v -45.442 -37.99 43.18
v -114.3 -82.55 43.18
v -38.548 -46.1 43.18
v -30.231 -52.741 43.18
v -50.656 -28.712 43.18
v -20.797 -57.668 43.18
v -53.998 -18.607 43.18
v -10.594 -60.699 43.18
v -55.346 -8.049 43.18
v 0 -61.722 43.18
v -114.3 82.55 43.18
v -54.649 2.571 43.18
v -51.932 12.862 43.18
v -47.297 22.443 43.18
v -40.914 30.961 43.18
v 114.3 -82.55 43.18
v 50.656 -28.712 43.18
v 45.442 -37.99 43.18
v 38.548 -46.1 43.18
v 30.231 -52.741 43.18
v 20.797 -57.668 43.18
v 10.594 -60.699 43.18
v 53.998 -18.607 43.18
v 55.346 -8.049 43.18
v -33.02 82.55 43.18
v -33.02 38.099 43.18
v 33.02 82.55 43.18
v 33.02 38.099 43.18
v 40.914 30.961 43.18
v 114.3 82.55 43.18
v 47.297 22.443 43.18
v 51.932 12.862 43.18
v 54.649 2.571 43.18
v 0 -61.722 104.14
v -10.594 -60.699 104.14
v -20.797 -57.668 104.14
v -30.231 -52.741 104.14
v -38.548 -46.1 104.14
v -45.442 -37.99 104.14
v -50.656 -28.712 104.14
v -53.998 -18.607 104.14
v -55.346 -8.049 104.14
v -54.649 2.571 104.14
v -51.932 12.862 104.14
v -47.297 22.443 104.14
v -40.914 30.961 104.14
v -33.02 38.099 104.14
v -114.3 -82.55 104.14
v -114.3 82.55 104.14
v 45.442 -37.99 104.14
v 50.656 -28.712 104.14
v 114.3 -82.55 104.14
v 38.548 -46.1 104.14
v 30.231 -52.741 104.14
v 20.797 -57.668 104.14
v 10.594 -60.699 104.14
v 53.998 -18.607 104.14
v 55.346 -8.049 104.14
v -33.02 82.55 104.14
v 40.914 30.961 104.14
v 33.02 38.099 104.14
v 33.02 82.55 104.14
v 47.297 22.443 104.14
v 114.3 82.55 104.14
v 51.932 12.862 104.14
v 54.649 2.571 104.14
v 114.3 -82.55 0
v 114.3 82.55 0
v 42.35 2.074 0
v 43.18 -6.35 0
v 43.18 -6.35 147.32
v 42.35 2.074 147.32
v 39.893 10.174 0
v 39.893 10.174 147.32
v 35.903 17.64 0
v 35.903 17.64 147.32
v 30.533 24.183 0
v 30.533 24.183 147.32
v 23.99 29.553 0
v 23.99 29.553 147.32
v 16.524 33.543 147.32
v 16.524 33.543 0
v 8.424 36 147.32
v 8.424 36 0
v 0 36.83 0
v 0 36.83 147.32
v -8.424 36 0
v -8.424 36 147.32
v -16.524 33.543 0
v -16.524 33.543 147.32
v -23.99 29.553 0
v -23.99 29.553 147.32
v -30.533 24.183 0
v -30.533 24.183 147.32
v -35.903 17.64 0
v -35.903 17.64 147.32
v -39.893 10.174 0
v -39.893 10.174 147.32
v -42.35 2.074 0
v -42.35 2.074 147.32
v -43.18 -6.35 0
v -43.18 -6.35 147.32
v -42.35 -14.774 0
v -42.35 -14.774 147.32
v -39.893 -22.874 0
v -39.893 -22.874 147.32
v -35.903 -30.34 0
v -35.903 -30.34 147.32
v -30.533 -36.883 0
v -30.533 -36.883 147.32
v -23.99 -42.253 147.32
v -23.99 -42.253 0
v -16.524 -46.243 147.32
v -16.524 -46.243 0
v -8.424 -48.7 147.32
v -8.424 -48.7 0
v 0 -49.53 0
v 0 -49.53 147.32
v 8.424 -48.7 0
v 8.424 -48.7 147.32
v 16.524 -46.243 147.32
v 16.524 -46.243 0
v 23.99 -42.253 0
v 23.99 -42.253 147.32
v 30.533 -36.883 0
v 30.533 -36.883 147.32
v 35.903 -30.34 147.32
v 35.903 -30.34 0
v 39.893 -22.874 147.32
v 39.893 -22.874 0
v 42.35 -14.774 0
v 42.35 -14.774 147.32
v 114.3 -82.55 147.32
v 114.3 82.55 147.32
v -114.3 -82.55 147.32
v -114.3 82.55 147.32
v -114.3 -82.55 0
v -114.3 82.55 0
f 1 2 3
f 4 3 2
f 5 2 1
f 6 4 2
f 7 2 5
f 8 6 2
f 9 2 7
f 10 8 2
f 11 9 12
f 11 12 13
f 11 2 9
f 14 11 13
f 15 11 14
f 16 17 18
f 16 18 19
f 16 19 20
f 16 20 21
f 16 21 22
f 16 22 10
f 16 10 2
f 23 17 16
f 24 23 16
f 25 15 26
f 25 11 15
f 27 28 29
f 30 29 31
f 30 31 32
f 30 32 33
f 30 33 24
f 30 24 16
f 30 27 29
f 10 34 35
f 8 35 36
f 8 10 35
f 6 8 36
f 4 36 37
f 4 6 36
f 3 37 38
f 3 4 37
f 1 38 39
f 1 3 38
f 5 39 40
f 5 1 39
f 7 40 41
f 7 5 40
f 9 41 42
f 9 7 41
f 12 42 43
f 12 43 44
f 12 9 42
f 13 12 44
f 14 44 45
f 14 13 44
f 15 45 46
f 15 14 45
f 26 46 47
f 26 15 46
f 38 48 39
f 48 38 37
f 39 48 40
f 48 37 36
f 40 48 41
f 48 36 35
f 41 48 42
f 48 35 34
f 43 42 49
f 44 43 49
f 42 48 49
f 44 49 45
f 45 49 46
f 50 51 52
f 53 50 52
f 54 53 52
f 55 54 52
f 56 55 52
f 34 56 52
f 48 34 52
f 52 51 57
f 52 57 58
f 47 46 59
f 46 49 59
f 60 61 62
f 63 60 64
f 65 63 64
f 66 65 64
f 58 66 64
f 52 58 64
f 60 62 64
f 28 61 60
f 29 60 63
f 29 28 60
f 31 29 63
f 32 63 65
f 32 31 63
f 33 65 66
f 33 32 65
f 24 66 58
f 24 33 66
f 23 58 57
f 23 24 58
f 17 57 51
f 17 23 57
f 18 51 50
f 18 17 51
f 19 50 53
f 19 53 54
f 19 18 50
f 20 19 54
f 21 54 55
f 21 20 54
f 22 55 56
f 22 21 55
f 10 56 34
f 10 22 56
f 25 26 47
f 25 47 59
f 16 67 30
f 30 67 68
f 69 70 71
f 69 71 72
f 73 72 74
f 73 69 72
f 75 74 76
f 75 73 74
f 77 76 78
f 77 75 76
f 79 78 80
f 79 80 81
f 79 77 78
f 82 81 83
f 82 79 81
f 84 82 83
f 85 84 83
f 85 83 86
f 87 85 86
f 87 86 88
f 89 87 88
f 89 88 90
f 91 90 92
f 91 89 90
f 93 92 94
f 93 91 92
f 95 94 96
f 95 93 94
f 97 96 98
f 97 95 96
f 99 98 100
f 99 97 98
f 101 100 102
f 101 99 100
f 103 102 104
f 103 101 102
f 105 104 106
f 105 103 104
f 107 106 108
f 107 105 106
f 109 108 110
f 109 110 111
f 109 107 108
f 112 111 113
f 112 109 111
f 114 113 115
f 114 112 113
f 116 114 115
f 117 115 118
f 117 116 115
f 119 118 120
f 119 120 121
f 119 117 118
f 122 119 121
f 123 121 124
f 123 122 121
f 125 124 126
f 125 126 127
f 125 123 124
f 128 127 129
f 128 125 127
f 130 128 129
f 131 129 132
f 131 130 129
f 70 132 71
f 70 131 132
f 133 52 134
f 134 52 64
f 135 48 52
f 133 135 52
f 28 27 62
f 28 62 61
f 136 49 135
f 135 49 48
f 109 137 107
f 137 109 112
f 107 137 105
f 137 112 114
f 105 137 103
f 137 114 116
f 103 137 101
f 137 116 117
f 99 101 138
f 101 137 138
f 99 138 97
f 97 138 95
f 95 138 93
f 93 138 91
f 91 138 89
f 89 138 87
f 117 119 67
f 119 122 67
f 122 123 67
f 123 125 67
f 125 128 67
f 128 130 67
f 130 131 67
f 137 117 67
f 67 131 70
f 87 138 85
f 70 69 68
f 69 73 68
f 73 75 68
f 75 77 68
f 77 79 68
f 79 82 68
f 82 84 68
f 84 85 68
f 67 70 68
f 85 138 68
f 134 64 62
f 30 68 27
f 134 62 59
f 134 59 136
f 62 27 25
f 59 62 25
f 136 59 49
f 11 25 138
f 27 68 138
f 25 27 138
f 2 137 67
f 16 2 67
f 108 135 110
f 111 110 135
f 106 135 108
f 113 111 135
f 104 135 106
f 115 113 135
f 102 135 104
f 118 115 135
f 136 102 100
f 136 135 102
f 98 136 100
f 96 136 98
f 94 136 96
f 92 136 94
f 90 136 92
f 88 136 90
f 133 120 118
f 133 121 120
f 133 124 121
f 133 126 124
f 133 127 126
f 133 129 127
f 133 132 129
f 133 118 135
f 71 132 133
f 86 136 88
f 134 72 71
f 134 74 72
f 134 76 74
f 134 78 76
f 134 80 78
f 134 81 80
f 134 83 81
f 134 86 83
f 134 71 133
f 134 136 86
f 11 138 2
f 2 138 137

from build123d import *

# Parameters (mm, degrees)
F0_R     = 43.18
F1_DEPTH = 147.32
F2_DEPTH = 104.14
F3_DEPTH = 43.18


with BuildPart() as f1:
    # F0 (on Top) → F1 (new body)
    with BuildSketch(Plane.XY):
        with BuildLine():
            Line((-114.3, 82.55), (-114.3, -82.55))
            Line((-114.3, -82.55), (114.3, -82.55))
            Line((114.3, -82.55), (114.3, 82.55))
            Line((114.3, 82.55), (33.02, 82.55))
            Line((33.02, 82.55), (33.02, 38.099274))
            ThreePointArc((33.02, 38.099274), (52.570446, -23.739841), (0, -61.722))
            ThreePointArc((0, -61.722), (-52.570446, -23.739841), (-33.02, 38.099274))
            Line((-33.02, 38.099274), (-33.02, 82.55))
            Line((-33.02, 82.55), (-114.3, 82.55))
        make_face()
        with BuildLine():
            Line((0, 82.55), (-33.02, 82.55))
            Line((-33.02, 82.55), (-33.02, 38.099274))
            ThreePointArc((-33.02, 38.099274), (-52.570446, -23.739841), (0, -61.722))
            ThreePointArc((0, -61.722), (52.570446, -23.739841), (33.02, 38.099274))
            Line((33.02, 38.099274), (33.02, 82.55))
            Line((33.02, 82.55), (0, 82.55))
        make_face()
        with Locations((0, -6.35)):
            Circle(F0_R, mode=Mode.SUBTRACT)
    extrude(amount=F1_DEPTH)

    # F0 (on Top) → F2 (cut)
    with BuildSketch(Plane.XY):
        with BuildLine():
            Line((-114.3, 82.55), (-114.3, -82.55))
            Line((-114.3, -82.55), (114.3, -82.55))
            Line((114.3, -82.55), (114.3, 82.55))
            Line((114.3, 82.55), (33.02, 82.55))
            Line((33.02, 82.55), (33.02, 38.099274))
            ThreePointArc((33.02, 38.099274), (52.570446, -23.739841), (0, -61.722))
            ThreePointArc((0, -61.722), (-52.570446, -23.739841), (-33.02, 38.099274))
            Line((-33.02, 38.099274), (-33.02, 82.55))
            Line((-33.02, 82.55), (-114.3, 82.55))
        make_face()
    extrude(amount=F2_DEPTH, mode=Mode.SUBTRACT)

    # F0 (on Top) → F3 (join)
    with BuildSketch(Plane.XY):
        with BuildLine():
            Line((-114.3, 82.55), (-114.3, -82.55))
            Line((-114.3, -82.55), (114.3, -82.55))
            Line((114.3, -82.55), (114.3, 82.55))
            Line((114.3, 82.55), (33.02, 82.55))
            Line((33.02, 82.55), (33.02, 38.099274))
            ThreePointArc((33.02, 38.099274), (52.570446, -23.739841), (0, -61.722))
            ThreePointArc((0, -61.722), (-52.570446, -23.739841), (-33.02, 38.099274))
            Line((-33.02, 38.099274), (-33.02, 82.55))
            Line((-33.02, 82.55), (-114.3, 82.55))
        make_face()
    extrude(amount=F3_DEPTH)


solid = f1.part
